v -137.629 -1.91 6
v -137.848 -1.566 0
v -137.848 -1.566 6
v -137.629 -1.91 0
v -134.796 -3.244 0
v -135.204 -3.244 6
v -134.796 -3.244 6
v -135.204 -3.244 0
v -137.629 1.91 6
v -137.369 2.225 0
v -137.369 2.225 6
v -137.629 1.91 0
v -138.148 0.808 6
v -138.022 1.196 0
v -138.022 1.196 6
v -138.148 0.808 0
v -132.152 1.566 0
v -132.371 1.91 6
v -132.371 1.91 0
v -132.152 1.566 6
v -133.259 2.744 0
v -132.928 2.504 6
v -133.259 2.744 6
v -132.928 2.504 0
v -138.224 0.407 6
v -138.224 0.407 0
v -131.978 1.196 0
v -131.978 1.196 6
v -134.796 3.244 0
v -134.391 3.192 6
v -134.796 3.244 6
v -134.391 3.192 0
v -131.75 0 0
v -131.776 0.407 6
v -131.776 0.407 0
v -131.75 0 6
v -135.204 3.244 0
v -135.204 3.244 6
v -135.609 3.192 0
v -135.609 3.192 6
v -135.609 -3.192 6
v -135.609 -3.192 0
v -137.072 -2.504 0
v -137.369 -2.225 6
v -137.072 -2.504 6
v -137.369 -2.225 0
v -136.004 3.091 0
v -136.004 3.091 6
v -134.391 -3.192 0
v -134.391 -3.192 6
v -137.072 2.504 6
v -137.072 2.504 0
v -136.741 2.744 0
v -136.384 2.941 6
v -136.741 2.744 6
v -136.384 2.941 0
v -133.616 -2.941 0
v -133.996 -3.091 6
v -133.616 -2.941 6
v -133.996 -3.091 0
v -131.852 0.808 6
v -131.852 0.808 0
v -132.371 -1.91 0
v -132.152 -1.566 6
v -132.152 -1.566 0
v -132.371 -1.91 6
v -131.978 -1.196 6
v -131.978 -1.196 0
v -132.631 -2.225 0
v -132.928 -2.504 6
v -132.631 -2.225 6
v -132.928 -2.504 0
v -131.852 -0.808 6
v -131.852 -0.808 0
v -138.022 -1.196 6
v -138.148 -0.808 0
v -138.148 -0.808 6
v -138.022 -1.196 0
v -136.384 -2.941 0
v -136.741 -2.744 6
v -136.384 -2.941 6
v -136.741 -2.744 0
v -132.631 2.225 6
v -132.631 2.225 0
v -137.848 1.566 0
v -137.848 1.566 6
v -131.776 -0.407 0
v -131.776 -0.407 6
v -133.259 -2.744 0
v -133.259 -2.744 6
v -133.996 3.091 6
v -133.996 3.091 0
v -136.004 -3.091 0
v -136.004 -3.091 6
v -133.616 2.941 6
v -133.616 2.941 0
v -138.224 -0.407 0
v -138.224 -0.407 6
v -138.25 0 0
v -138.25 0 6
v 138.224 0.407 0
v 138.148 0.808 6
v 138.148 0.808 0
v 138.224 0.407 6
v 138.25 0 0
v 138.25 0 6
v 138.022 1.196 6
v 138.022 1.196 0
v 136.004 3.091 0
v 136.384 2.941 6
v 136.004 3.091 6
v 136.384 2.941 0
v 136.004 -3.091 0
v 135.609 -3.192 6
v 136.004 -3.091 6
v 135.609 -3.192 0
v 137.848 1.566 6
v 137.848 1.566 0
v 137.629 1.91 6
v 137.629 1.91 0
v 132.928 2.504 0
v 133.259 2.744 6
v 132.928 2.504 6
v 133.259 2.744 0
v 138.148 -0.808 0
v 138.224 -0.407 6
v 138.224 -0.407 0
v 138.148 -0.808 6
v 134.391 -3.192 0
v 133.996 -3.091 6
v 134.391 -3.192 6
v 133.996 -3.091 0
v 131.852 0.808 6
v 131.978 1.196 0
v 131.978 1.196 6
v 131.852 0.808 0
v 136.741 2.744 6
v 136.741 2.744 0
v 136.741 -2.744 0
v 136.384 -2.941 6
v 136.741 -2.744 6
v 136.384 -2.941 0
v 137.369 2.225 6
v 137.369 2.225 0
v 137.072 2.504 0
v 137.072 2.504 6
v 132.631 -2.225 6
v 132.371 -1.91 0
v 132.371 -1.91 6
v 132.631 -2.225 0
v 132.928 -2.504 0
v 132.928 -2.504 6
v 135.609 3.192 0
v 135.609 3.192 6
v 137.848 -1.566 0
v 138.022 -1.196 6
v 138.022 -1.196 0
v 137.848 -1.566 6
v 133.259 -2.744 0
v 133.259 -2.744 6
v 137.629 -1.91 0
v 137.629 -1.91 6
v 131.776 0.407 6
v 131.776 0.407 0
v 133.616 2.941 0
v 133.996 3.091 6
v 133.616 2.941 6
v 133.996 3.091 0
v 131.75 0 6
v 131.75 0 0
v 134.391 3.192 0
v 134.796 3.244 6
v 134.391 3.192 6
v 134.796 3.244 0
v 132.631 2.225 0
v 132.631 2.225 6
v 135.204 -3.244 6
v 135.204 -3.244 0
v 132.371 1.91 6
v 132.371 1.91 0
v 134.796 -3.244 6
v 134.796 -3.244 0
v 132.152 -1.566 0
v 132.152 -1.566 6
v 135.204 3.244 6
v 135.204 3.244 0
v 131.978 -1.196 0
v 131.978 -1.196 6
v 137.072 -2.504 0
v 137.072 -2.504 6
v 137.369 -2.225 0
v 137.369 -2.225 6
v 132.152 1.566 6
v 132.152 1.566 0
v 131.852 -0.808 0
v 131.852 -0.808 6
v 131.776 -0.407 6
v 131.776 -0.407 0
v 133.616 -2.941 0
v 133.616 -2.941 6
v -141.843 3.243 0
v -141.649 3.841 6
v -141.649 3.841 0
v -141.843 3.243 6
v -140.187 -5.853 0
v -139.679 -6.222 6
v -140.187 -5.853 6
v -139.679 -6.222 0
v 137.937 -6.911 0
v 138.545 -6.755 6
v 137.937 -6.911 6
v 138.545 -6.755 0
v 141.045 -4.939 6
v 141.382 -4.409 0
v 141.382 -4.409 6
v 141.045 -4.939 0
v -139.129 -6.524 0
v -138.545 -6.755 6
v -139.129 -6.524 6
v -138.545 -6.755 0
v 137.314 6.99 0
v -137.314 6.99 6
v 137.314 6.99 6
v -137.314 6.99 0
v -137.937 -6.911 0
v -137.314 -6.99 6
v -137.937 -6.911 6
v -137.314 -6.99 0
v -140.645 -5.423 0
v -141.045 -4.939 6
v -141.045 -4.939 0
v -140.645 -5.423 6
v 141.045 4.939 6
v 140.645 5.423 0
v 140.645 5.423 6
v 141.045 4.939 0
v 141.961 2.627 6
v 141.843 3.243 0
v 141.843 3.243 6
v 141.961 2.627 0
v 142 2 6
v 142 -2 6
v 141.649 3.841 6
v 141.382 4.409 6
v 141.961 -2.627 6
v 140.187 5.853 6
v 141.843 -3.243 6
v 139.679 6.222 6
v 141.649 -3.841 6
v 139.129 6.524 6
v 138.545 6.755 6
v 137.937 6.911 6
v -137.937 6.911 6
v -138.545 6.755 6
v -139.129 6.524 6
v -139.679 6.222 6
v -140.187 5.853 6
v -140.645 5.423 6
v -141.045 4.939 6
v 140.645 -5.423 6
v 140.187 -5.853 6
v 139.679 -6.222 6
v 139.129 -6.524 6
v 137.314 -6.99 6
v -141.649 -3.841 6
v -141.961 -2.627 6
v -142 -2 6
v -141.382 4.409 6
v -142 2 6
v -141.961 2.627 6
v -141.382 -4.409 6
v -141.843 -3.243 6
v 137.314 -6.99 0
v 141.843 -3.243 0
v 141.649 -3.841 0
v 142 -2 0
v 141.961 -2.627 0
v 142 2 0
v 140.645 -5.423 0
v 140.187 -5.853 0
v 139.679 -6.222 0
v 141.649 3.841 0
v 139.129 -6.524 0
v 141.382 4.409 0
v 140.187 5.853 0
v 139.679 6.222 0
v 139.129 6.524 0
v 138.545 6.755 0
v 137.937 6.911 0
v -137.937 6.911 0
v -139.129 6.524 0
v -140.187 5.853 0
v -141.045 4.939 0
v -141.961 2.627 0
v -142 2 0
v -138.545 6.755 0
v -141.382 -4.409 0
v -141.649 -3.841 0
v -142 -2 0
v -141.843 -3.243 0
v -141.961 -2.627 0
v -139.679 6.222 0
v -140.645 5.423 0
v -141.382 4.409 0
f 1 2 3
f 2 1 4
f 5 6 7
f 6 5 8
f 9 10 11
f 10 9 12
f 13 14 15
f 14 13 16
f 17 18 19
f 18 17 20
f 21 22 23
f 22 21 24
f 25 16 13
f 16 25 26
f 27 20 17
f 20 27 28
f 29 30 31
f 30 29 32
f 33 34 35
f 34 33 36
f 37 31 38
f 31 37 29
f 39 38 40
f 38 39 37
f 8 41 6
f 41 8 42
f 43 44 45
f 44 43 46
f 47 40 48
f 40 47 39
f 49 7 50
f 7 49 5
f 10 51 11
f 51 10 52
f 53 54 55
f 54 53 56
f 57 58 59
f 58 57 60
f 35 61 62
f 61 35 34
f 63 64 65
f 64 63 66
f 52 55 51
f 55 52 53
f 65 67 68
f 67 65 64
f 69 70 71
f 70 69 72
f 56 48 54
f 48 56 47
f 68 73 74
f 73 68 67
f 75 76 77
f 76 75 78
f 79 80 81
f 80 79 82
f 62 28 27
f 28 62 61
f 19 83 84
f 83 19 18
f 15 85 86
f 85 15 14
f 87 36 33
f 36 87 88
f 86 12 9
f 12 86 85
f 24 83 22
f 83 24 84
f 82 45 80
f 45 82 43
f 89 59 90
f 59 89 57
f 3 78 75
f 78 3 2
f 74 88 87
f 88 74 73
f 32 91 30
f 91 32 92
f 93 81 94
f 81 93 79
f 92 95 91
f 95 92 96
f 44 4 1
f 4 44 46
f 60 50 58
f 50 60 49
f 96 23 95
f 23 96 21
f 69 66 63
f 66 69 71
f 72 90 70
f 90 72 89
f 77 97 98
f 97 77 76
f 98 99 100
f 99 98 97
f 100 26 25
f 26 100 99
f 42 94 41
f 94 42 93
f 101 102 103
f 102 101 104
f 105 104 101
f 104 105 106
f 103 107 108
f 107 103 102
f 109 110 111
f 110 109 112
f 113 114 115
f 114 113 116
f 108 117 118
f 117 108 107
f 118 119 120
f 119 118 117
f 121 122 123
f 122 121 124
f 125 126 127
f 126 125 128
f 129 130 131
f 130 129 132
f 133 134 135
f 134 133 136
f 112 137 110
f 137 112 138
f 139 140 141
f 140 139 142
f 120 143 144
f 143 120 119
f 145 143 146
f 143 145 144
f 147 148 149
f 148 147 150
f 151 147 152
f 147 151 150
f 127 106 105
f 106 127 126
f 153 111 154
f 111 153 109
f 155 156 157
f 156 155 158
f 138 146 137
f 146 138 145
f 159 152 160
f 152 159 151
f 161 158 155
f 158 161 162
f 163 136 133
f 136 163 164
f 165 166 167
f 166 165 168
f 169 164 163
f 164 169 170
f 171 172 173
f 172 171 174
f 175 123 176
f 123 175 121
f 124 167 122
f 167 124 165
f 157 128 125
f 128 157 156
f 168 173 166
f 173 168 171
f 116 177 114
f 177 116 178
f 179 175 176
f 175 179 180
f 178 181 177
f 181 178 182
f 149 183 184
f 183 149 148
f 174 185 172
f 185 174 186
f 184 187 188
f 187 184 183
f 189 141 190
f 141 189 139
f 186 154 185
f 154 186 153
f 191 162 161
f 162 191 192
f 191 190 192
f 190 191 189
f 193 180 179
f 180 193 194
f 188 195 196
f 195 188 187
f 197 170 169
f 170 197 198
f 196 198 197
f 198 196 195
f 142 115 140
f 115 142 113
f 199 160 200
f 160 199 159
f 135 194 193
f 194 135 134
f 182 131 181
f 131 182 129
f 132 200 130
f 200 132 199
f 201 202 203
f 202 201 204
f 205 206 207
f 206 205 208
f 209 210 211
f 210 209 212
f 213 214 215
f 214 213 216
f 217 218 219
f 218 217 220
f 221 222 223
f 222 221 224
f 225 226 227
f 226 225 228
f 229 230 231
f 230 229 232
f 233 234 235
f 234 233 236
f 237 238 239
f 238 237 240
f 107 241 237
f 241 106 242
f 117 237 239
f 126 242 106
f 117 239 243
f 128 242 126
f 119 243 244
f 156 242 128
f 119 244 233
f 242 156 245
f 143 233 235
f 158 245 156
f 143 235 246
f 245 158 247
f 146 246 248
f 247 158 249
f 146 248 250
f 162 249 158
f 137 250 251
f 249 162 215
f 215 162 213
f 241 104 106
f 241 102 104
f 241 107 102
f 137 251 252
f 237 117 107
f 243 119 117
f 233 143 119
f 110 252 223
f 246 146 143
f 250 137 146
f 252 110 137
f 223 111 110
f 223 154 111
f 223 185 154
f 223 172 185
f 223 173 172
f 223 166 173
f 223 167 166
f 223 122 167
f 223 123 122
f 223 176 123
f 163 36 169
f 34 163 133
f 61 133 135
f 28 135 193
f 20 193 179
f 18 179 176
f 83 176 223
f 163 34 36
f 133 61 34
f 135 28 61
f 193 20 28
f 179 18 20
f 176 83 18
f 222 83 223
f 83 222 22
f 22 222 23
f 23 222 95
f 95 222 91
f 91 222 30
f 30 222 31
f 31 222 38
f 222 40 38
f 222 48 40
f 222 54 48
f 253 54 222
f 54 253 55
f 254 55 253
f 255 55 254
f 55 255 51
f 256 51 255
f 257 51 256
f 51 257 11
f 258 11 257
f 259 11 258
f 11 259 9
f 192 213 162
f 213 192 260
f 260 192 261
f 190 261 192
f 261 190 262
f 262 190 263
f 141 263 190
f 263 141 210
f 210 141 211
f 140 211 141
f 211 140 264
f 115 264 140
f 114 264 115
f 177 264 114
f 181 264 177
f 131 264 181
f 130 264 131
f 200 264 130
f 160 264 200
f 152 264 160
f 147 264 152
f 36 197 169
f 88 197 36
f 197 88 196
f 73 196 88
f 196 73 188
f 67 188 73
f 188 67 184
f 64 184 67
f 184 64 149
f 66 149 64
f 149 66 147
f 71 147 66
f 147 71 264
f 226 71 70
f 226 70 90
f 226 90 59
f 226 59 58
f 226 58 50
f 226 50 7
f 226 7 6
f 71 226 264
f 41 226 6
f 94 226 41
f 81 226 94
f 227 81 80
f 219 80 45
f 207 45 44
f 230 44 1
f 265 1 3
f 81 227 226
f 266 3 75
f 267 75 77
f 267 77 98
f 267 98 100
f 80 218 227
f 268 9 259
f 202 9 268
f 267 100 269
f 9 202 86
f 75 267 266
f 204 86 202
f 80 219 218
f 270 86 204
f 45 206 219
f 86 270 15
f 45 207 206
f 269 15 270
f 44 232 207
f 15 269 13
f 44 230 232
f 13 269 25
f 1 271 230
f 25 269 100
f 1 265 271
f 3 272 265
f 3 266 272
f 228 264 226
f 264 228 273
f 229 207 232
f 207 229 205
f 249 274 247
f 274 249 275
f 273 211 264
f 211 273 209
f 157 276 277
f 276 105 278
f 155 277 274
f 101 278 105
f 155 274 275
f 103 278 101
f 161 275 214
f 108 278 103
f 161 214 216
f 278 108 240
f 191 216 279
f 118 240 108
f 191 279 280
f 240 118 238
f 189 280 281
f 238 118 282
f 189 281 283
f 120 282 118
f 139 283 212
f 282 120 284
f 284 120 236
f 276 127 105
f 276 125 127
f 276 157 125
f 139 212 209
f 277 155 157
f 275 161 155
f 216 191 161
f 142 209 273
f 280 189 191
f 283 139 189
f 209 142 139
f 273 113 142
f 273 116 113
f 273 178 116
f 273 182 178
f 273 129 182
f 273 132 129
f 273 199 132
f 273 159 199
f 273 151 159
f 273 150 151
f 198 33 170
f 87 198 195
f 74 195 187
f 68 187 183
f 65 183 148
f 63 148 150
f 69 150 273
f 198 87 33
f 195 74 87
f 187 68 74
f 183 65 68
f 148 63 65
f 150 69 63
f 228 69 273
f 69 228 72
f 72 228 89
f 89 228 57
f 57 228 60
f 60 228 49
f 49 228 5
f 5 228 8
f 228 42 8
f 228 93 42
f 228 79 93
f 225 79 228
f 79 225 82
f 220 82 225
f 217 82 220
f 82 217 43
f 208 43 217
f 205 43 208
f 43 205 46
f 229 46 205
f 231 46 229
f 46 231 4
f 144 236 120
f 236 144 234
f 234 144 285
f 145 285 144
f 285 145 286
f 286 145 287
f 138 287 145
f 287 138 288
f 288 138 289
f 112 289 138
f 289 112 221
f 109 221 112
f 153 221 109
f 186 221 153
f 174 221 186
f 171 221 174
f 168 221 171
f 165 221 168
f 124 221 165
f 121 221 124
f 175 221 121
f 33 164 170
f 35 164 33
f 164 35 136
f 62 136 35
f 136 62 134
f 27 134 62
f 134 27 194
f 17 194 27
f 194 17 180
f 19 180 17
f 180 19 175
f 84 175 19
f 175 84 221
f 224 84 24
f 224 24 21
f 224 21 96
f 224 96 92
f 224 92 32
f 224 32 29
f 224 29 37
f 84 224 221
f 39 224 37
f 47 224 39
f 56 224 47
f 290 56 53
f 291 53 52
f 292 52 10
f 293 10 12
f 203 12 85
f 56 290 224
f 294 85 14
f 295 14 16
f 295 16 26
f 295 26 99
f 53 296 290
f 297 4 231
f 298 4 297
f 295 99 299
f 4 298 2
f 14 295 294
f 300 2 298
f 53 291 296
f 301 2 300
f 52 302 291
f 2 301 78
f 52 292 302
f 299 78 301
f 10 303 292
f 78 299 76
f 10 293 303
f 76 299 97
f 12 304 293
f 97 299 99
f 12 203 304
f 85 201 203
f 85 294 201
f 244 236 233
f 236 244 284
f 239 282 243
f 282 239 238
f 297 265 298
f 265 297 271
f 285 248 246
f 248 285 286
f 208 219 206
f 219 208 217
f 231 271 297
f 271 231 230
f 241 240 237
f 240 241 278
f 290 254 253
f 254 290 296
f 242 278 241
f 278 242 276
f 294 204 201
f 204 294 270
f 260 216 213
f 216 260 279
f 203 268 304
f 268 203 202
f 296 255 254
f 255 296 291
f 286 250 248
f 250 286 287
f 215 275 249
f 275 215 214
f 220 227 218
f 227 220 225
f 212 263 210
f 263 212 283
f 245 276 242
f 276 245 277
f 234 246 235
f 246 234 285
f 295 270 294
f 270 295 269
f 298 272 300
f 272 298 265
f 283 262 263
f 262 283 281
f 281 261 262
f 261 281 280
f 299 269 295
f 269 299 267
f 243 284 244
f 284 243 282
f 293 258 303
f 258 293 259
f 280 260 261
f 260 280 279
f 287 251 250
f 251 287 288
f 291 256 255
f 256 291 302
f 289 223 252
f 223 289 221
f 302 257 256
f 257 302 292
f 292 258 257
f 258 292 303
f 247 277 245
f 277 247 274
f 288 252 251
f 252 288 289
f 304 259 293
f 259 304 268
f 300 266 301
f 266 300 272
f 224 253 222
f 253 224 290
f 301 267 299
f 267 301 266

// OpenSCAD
$fn = 50;


difference() {
	union() {
		hull() {
			translate(v = [-137.0000000000, 2.0000000000, 0]) {
				cylinder(h = 6, r = 5);
			}
			translate(v = [137.0000000000, 2.0000000000, 0]) {
				cylinder(h = 6, r = 5);
			}
			translate(v = [-137.0000000000, -2.0000000000, 0]) {
				cylinder(h = 6, r = 5);
			}
			translate(v = [137.0000000000, -2.0000000000, 0]) {
				cylinder(h = 6, r = 5);
			}
		}
	}
	union() {
		translate(v = [-135.0000000000, 0.0000000000, -100.0000000000]) {
			cylinder(h = 200, r = 3.2500000000);
		}
		translate(v = [-135.0000000000, 0.0000000000, -100.0000000000]) {
			cylinder(h = 200, r = 3.2500000000);
		}
		translate(v = [135.0000000000, 0.0000000000, -100.0000000000]) {
			cylinder(h = 200, r = 3.2500000000);
		}
		translate(v = [135.0000000000, 0.0000000000, -100.0000000000]) {
			cylinder(h = 200, r = 3.2500000000);
		}
	}
}
